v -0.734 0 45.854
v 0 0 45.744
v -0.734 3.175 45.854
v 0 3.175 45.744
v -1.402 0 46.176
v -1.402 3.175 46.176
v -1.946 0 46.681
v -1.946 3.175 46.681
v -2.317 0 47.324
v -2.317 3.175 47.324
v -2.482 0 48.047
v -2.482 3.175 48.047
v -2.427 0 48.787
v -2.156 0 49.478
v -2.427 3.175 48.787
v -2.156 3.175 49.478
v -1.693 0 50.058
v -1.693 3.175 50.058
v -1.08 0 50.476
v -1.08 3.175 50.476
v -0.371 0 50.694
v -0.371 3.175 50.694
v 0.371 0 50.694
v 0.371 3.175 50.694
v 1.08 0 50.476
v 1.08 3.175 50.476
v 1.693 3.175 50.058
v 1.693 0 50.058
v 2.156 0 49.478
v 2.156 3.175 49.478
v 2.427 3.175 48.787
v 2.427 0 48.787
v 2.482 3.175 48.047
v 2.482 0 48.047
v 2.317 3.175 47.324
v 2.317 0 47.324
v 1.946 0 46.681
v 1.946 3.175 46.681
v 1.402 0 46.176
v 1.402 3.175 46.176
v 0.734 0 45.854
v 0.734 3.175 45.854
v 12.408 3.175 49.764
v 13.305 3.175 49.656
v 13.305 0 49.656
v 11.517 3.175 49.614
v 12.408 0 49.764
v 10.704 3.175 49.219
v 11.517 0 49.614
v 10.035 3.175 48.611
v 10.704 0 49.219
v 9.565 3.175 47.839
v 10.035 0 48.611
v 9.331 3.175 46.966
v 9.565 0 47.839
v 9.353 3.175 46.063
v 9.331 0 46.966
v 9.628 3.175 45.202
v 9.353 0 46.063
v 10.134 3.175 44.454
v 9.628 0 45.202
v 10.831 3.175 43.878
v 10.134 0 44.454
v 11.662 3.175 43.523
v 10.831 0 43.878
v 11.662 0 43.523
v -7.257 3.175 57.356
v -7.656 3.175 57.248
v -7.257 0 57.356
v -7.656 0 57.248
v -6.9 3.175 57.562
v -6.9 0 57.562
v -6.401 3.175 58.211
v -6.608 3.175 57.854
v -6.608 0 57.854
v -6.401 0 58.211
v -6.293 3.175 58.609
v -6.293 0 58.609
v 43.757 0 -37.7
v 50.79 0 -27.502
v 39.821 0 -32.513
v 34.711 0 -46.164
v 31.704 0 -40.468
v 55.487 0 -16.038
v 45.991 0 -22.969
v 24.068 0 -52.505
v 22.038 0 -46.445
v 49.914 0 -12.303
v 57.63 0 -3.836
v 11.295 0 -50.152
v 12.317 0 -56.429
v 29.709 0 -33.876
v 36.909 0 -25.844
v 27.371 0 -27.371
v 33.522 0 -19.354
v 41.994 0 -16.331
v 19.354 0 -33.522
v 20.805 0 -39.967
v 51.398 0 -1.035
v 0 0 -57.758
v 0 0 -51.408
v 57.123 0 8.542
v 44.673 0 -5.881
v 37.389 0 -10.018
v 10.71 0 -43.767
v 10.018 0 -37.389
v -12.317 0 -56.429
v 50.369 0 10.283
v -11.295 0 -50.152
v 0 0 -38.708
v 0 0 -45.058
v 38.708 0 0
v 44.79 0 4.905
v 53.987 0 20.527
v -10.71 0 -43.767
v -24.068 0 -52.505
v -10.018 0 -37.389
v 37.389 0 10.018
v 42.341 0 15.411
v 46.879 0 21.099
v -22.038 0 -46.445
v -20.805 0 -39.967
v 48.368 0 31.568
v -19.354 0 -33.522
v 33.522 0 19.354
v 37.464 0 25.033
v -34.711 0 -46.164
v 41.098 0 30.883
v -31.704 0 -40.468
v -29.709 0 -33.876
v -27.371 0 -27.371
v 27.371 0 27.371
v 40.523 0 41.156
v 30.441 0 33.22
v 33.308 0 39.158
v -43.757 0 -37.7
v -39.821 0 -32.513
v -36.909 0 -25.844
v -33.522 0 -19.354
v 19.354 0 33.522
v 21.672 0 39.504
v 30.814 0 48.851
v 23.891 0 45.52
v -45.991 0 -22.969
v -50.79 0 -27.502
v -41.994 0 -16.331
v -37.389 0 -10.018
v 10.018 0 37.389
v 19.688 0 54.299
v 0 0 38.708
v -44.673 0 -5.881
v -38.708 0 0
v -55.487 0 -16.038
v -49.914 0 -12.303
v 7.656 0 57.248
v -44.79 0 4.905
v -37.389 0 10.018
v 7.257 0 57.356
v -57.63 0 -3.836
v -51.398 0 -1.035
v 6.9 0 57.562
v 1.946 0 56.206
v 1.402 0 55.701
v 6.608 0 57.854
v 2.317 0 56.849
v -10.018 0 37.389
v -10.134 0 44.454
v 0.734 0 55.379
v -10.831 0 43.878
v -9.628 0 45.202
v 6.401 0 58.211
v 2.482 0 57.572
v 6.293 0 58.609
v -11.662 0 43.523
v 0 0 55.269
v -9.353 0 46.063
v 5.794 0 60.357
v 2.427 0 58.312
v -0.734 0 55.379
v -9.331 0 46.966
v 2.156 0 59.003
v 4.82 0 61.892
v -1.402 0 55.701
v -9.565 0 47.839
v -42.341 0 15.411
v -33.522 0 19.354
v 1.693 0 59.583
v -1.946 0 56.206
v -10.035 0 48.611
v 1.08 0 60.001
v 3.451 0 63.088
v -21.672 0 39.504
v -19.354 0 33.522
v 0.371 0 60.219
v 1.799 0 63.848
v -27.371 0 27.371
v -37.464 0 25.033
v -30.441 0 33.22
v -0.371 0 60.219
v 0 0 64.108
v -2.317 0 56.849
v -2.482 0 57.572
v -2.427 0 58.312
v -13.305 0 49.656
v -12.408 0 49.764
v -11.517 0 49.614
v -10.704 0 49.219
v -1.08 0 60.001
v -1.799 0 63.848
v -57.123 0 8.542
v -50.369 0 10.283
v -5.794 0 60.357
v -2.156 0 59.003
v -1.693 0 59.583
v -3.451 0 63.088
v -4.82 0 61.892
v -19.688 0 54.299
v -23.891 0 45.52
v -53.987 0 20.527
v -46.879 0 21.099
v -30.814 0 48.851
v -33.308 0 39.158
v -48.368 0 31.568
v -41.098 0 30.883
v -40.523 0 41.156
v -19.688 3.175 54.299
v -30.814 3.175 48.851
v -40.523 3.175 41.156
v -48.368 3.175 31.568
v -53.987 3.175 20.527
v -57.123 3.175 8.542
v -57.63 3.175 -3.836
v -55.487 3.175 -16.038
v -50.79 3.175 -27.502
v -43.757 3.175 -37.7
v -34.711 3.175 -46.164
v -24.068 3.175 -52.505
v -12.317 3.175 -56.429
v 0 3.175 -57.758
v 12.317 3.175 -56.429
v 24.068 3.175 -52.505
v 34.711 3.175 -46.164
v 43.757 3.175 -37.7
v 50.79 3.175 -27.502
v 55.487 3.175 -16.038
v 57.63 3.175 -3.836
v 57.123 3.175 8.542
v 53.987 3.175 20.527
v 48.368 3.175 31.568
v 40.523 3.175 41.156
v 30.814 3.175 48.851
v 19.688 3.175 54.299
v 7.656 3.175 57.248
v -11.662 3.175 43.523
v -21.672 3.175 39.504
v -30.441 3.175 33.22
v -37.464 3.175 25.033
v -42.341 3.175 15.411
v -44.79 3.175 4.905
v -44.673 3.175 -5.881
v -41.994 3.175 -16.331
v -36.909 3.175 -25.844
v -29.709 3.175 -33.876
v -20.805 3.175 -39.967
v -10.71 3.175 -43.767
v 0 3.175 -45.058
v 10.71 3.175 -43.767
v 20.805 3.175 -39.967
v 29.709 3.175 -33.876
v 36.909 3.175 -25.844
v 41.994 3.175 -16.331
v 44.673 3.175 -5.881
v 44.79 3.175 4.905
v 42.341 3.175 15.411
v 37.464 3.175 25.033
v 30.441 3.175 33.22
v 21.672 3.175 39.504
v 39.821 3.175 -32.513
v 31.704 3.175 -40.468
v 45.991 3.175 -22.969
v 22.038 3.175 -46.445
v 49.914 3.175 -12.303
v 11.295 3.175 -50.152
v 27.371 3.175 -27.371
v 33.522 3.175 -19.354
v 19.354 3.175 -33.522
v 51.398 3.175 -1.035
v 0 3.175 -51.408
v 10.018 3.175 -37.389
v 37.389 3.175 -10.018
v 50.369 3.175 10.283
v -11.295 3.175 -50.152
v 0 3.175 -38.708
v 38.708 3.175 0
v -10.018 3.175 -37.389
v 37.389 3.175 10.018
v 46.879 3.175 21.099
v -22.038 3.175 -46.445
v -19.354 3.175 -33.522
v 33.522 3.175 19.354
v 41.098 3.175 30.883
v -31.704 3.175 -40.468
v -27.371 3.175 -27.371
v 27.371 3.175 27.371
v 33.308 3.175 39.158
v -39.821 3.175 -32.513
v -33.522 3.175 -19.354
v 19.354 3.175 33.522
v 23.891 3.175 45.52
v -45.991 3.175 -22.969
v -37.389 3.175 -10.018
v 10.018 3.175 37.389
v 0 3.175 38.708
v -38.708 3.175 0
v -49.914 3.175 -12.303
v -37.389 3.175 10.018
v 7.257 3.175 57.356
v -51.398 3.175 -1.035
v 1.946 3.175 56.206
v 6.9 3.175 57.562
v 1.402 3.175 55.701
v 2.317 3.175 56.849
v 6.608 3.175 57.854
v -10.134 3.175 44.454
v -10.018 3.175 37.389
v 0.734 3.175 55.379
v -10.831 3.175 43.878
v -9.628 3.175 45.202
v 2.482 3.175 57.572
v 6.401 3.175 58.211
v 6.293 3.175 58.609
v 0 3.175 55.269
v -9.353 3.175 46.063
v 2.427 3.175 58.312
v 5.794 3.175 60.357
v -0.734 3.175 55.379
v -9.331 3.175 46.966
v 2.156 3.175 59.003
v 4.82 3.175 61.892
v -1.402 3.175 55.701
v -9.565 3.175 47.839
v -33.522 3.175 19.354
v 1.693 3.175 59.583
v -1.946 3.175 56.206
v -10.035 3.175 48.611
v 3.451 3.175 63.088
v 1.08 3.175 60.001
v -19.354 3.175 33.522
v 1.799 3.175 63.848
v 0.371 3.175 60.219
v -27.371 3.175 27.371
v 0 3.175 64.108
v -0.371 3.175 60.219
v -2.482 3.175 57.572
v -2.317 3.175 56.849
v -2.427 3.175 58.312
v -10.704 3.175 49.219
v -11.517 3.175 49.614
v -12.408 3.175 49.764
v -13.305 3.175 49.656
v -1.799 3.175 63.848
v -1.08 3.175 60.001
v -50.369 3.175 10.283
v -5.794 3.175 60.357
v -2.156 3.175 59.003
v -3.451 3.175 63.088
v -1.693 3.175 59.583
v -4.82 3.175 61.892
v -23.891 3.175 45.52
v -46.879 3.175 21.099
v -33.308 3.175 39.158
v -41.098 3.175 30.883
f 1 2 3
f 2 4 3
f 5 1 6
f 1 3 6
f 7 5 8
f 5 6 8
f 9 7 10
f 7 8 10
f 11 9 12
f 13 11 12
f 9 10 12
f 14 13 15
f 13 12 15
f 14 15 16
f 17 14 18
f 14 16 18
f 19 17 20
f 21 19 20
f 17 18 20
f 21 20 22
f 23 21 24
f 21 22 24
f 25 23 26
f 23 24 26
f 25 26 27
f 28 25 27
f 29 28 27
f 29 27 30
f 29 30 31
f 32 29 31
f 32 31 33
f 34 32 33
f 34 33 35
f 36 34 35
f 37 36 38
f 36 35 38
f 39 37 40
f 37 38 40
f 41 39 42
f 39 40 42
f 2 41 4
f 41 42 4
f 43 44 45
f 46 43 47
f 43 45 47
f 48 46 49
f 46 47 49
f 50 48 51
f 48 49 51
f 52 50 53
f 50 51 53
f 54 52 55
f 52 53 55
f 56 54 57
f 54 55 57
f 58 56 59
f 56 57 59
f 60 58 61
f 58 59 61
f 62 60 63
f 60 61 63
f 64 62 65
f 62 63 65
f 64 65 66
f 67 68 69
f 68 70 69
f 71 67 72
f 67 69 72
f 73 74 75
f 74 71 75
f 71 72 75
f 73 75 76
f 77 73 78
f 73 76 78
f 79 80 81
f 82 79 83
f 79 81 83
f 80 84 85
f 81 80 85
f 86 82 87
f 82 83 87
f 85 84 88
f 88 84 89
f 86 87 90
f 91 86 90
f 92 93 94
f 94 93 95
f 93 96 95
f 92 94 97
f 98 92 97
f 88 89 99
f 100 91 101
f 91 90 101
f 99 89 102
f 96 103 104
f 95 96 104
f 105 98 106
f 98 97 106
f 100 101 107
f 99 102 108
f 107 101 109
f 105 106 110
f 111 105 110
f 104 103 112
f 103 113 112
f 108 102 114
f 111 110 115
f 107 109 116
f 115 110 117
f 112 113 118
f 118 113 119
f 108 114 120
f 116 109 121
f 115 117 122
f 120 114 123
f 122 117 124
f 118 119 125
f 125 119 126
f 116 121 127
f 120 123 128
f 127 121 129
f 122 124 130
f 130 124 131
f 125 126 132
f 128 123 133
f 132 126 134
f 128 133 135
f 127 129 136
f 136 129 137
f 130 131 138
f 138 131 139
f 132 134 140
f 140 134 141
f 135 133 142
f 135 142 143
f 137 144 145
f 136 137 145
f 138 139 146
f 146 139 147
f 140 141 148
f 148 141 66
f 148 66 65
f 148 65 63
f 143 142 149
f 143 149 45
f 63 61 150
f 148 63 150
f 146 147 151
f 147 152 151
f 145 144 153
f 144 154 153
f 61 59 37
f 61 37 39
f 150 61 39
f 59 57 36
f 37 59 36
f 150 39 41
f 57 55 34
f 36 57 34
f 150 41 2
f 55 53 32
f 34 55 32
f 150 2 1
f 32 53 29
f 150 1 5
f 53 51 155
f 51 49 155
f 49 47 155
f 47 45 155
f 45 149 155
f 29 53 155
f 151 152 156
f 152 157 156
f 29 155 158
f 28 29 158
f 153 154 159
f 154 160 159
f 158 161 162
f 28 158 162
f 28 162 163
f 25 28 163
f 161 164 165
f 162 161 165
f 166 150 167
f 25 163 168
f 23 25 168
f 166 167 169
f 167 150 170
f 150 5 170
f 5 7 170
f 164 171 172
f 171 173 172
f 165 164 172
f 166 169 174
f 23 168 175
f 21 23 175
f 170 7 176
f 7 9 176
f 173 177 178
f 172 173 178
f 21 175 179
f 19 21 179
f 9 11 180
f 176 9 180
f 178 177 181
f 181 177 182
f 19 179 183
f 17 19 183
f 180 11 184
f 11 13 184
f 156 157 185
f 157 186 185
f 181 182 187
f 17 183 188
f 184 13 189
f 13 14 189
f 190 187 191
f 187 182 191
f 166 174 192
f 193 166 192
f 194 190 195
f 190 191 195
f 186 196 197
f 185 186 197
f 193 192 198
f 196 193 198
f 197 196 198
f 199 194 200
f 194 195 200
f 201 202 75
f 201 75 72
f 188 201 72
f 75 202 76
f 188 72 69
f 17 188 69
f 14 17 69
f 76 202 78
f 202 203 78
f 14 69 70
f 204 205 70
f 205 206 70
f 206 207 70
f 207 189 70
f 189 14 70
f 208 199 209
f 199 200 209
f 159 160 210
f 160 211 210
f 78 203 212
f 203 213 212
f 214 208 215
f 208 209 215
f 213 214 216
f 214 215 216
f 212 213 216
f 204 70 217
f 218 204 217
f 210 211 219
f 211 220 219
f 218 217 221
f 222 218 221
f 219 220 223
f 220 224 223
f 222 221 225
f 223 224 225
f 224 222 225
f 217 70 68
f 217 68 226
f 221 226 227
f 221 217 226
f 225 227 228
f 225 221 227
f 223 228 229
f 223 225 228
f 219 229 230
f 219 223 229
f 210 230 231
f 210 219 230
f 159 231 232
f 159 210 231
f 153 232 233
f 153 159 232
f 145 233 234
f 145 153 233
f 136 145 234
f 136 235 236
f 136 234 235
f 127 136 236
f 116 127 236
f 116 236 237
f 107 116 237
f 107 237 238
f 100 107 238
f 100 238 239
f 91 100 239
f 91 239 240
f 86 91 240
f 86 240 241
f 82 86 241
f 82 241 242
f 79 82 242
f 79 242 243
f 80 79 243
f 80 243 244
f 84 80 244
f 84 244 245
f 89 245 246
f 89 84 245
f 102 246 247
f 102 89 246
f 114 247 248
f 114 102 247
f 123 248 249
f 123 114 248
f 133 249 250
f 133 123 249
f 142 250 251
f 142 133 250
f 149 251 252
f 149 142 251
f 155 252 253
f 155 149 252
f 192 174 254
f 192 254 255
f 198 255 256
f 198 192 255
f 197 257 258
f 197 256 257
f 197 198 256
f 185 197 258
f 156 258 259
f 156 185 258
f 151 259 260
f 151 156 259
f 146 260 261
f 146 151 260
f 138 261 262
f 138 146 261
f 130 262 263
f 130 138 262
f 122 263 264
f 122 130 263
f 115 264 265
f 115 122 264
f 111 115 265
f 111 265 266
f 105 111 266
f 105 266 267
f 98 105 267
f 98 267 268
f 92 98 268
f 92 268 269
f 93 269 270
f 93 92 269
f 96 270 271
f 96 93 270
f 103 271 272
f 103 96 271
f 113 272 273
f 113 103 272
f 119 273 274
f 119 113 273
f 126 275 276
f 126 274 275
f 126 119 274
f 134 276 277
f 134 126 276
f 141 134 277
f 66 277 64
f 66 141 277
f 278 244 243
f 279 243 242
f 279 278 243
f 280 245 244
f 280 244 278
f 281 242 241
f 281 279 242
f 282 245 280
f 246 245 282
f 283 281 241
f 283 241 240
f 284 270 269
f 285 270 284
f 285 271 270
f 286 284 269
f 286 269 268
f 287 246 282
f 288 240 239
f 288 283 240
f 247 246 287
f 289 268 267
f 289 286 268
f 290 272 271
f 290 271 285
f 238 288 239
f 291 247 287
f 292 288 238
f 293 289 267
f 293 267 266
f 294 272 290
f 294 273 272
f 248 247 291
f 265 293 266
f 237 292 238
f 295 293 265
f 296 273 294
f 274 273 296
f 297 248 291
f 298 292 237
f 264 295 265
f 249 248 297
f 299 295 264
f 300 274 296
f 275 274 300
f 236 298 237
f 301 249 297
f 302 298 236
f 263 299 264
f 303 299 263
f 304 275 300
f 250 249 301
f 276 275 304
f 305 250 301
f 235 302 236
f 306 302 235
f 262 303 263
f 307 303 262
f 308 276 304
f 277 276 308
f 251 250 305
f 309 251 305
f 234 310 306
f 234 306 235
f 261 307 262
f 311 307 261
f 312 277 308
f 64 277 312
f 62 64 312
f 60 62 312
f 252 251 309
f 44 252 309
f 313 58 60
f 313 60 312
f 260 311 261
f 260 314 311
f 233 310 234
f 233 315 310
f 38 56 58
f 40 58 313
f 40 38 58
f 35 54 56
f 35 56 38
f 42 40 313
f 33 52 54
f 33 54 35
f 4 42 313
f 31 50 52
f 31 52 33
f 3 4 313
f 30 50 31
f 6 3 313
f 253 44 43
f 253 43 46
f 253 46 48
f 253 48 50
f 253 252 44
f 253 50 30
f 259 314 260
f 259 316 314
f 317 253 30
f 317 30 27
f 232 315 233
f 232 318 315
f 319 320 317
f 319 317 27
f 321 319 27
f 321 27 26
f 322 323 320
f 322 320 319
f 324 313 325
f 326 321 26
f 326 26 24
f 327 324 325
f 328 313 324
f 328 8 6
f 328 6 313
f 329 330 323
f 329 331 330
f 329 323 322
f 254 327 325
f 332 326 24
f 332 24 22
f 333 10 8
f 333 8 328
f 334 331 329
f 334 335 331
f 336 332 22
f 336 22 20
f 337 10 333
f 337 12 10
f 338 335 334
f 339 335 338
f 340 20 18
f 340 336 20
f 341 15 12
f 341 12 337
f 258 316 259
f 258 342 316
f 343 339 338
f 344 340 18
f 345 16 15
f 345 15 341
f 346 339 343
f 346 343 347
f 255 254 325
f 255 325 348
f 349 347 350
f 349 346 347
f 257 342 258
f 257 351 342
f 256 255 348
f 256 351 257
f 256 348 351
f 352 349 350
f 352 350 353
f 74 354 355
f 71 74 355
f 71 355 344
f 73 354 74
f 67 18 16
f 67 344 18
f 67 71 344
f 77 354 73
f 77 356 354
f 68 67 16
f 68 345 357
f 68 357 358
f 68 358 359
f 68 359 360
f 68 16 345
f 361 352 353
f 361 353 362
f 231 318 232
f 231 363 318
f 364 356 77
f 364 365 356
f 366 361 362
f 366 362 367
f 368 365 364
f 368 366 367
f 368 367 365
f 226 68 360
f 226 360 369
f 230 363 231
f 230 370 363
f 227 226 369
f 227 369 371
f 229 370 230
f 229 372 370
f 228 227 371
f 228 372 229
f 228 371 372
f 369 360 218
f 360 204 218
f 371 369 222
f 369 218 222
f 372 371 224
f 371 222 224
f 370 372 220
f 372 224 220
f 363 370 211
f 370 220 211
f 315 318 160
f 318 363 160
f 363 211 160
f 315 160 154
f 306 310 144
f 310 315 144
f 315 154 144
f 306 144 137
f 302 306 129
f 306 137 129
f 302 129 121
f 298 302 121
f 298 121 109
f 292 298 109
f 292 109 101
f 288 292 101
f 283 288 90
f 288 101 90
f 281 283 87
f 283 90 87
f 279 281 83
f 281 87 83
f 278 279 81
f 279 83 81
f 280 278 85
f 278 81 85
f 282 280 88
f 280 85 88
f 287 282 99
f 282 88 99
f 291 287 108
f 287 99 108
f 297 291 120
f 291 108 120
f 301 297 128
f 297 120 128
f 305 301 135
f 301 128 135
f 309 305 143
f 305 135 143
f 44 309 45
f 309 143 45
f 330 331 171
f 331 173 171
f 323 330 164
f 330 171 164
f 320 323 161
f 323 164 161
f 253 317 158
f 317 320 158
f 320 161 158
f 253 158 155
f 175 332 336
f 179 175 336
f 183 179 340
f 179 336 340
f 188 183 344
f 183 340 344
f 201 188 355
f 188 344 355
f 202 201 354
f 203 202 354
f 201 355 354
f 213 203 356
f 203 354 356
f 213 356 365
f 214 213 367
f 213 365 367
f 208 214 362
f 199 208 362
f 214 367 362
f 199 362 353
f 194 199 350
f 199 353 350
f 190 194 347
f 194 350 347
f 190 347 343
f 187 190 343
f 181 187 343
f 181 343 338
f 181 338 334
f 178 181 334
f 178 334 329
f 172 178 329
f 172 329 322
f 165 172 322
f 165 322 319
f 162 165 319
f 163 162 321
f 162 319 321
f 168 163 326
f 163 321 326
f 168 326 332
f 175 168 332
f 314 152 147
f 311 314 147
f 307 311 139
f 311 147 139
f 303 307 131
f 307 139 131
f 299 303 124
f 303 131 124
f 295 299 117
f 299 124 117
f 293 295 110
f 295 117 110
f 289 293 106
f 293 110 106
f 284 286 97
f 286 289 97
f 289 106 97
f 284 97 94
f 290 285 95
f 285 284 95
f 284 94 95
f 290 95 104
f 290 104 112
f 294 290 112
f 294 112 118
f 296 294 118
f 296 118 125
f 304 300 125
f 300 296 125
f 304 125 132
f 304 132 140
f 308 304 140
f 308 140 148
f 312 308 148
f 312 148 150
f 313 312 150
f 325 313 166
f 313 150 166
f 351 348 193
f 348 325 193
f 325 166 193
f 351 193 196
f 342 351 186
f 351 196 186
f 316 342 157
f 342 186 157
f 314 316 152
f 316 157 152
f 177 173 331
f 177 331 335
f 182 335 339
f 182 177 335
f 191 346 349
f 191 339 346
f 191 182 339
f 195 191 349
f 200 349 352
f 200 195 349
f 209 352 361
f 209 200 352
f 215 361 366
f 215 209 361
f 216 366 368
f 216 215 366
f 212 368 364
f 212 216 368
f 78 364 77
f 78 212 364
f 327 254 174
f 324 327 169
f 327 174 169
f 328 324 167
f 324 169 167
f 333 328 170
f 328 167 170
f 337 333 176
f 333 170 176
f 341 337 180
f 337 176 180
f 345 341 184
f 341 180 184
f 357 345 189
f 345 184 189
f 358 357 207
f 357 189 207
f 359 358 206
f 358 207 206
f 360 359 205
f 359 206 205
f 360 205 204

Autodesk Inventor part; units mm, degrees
ref_plane "YZ Plane" through (0, 0, 0) normal (1, 0, 0) x (0, 1, 0)
ref_plane "XZ Plane" through (0, 0, 0) normal (0, 1, 0) x (-1, 0, 0)
ref_plane "XY Plane" through (0, 0, 0) normal (0, 0, 1) x (1, 0, 0)
sketch "Sketch1" plane through (0, 0, 0) normal (0, 1, 0) x (-1, 0, 0)
  arc A0 (-9.3914, 47.3099) -> (9.3914, 47.3099) centre (0, 0) ccw
  arc A1 (-11.6619, 43.5227) -> (11.6619, 43.5227) centre (0, 0) ccw
  arc A2 (-13.3054, 49.6564) -> (13.3054, 49.6564) centre (0, 0) ccw
  circle A3 centre (0, 0) radius 38.708
  circle A4 centre (12.4836, 46.5895) radius 3.175
  circle A5 centre (-12.4836, 46.5895) radius 3.175
  line L0 (0, 0) -> (12.4836, 46.5895)
  line L1 (0, 0) -> (-12.4836, 46.5895)
  line L2 (0, 0) -> (0, 57.758)
  arc A6 (6.2927, 58.6092) -> (-6.2927, 58.6092) centre (0, 57.758) ccw
  arc A7 (6.2927, 58.6092) -> (7.6555, 57.2484) centre (7.8659, 58.8219) ccw
  arc A8 (-7.6555, 57.2484) -> (-6.2927, 58.6092) centre (-7.8659, 58.8219) ccw
  arc A9 (-7.6555, 57.2484) -> (7.6555, 57.2484) centre (0, 0) ccw
  point P0 (0, 48.233)
  point P1 (11.6619, 43.5227)
  point P2 (-11.6619, 43.5227)
  dimension "d0" = 96.4661
  dimension "d1" = 3.175
  dimension "d2" = 3.175
  dimension "d3" = 6.35
  dimension "d5" = 6.35
  dimension "d6" = 6.35
  dimension "d9" = 15
  dimension "d10" = 15
  dimension "d11" = 12.7
  dimension "d12" = 3.175
  dimension "d13" = 3.175
  dimension "d14" = 6.35
  dimension "d15" = 57.758
  dimension "d16" = 9.525
extrude "Extrusion1" add sketch "Sketch1" along normal blind 3.175 contours L1 A3 L0 A1 | A7 A9 A8 A6
hole "Hole1" at (0, 0, 48.233) at (0, 0, 57.758) direction (0, 1, 0) diameter 4.9784 end through all clearance for "Flat Head Machine Screw (82)" size "#10" standard "Ansi Unified Screw Threads"
equation "\"d0\" = ringDiam"
equation "\"d9\" = stageAngle"
equation "\"d10\" = stageAngle"
equation "\"d11\" = thickness"
equation "\"height\" = 203.2"
equation "\"thickness\" = 12.7"
equation "\"shaftDiam\" = 6.35"
equation "\"shaftSpace\" = 1.5875"
equation "\"stageSpace\" = 2.54"
equation "\"stageAngle\" = 15deg"
equation "\"bearingDiam\" = 9.5504"
equation "\"FlangeDiam\" = 12.7"
equation "\"FlangeDepth\" = 1.5875"
equation "\"smallFilet\" = 0.39687"
equation "\"ringDiam\" = 96.46608"
equation "\"stockHeight\" = 50.8"
equation "\"stockWidth\" = 76.2"
equation "\"stockRad\" = 9.525"
equation "\"stockGuage\" = 3.175"
equation "\"groundActu\" = 304.8"
equation "\"baseWidth\" = 1066.8"
equation "\"baseDepth\" = 254"
equation "\"capThickness\" = 3.175"
equation "\"sup1Len\" = 660.4"
equation "\"sup1Ang\" = 22.619865deg"
equation "\"sup2Len\" = 2079.37366"
equation "\"sup2Ang\" = 8.959949deg"
equation "\"supVertLen\" = 955.13561"
equation "\"supSideLen\" = 1531.12879"
equation "\"supSideAng\" = 19.376933deg"
properties part number "lock ring 2" material "Aluminum 6061"
